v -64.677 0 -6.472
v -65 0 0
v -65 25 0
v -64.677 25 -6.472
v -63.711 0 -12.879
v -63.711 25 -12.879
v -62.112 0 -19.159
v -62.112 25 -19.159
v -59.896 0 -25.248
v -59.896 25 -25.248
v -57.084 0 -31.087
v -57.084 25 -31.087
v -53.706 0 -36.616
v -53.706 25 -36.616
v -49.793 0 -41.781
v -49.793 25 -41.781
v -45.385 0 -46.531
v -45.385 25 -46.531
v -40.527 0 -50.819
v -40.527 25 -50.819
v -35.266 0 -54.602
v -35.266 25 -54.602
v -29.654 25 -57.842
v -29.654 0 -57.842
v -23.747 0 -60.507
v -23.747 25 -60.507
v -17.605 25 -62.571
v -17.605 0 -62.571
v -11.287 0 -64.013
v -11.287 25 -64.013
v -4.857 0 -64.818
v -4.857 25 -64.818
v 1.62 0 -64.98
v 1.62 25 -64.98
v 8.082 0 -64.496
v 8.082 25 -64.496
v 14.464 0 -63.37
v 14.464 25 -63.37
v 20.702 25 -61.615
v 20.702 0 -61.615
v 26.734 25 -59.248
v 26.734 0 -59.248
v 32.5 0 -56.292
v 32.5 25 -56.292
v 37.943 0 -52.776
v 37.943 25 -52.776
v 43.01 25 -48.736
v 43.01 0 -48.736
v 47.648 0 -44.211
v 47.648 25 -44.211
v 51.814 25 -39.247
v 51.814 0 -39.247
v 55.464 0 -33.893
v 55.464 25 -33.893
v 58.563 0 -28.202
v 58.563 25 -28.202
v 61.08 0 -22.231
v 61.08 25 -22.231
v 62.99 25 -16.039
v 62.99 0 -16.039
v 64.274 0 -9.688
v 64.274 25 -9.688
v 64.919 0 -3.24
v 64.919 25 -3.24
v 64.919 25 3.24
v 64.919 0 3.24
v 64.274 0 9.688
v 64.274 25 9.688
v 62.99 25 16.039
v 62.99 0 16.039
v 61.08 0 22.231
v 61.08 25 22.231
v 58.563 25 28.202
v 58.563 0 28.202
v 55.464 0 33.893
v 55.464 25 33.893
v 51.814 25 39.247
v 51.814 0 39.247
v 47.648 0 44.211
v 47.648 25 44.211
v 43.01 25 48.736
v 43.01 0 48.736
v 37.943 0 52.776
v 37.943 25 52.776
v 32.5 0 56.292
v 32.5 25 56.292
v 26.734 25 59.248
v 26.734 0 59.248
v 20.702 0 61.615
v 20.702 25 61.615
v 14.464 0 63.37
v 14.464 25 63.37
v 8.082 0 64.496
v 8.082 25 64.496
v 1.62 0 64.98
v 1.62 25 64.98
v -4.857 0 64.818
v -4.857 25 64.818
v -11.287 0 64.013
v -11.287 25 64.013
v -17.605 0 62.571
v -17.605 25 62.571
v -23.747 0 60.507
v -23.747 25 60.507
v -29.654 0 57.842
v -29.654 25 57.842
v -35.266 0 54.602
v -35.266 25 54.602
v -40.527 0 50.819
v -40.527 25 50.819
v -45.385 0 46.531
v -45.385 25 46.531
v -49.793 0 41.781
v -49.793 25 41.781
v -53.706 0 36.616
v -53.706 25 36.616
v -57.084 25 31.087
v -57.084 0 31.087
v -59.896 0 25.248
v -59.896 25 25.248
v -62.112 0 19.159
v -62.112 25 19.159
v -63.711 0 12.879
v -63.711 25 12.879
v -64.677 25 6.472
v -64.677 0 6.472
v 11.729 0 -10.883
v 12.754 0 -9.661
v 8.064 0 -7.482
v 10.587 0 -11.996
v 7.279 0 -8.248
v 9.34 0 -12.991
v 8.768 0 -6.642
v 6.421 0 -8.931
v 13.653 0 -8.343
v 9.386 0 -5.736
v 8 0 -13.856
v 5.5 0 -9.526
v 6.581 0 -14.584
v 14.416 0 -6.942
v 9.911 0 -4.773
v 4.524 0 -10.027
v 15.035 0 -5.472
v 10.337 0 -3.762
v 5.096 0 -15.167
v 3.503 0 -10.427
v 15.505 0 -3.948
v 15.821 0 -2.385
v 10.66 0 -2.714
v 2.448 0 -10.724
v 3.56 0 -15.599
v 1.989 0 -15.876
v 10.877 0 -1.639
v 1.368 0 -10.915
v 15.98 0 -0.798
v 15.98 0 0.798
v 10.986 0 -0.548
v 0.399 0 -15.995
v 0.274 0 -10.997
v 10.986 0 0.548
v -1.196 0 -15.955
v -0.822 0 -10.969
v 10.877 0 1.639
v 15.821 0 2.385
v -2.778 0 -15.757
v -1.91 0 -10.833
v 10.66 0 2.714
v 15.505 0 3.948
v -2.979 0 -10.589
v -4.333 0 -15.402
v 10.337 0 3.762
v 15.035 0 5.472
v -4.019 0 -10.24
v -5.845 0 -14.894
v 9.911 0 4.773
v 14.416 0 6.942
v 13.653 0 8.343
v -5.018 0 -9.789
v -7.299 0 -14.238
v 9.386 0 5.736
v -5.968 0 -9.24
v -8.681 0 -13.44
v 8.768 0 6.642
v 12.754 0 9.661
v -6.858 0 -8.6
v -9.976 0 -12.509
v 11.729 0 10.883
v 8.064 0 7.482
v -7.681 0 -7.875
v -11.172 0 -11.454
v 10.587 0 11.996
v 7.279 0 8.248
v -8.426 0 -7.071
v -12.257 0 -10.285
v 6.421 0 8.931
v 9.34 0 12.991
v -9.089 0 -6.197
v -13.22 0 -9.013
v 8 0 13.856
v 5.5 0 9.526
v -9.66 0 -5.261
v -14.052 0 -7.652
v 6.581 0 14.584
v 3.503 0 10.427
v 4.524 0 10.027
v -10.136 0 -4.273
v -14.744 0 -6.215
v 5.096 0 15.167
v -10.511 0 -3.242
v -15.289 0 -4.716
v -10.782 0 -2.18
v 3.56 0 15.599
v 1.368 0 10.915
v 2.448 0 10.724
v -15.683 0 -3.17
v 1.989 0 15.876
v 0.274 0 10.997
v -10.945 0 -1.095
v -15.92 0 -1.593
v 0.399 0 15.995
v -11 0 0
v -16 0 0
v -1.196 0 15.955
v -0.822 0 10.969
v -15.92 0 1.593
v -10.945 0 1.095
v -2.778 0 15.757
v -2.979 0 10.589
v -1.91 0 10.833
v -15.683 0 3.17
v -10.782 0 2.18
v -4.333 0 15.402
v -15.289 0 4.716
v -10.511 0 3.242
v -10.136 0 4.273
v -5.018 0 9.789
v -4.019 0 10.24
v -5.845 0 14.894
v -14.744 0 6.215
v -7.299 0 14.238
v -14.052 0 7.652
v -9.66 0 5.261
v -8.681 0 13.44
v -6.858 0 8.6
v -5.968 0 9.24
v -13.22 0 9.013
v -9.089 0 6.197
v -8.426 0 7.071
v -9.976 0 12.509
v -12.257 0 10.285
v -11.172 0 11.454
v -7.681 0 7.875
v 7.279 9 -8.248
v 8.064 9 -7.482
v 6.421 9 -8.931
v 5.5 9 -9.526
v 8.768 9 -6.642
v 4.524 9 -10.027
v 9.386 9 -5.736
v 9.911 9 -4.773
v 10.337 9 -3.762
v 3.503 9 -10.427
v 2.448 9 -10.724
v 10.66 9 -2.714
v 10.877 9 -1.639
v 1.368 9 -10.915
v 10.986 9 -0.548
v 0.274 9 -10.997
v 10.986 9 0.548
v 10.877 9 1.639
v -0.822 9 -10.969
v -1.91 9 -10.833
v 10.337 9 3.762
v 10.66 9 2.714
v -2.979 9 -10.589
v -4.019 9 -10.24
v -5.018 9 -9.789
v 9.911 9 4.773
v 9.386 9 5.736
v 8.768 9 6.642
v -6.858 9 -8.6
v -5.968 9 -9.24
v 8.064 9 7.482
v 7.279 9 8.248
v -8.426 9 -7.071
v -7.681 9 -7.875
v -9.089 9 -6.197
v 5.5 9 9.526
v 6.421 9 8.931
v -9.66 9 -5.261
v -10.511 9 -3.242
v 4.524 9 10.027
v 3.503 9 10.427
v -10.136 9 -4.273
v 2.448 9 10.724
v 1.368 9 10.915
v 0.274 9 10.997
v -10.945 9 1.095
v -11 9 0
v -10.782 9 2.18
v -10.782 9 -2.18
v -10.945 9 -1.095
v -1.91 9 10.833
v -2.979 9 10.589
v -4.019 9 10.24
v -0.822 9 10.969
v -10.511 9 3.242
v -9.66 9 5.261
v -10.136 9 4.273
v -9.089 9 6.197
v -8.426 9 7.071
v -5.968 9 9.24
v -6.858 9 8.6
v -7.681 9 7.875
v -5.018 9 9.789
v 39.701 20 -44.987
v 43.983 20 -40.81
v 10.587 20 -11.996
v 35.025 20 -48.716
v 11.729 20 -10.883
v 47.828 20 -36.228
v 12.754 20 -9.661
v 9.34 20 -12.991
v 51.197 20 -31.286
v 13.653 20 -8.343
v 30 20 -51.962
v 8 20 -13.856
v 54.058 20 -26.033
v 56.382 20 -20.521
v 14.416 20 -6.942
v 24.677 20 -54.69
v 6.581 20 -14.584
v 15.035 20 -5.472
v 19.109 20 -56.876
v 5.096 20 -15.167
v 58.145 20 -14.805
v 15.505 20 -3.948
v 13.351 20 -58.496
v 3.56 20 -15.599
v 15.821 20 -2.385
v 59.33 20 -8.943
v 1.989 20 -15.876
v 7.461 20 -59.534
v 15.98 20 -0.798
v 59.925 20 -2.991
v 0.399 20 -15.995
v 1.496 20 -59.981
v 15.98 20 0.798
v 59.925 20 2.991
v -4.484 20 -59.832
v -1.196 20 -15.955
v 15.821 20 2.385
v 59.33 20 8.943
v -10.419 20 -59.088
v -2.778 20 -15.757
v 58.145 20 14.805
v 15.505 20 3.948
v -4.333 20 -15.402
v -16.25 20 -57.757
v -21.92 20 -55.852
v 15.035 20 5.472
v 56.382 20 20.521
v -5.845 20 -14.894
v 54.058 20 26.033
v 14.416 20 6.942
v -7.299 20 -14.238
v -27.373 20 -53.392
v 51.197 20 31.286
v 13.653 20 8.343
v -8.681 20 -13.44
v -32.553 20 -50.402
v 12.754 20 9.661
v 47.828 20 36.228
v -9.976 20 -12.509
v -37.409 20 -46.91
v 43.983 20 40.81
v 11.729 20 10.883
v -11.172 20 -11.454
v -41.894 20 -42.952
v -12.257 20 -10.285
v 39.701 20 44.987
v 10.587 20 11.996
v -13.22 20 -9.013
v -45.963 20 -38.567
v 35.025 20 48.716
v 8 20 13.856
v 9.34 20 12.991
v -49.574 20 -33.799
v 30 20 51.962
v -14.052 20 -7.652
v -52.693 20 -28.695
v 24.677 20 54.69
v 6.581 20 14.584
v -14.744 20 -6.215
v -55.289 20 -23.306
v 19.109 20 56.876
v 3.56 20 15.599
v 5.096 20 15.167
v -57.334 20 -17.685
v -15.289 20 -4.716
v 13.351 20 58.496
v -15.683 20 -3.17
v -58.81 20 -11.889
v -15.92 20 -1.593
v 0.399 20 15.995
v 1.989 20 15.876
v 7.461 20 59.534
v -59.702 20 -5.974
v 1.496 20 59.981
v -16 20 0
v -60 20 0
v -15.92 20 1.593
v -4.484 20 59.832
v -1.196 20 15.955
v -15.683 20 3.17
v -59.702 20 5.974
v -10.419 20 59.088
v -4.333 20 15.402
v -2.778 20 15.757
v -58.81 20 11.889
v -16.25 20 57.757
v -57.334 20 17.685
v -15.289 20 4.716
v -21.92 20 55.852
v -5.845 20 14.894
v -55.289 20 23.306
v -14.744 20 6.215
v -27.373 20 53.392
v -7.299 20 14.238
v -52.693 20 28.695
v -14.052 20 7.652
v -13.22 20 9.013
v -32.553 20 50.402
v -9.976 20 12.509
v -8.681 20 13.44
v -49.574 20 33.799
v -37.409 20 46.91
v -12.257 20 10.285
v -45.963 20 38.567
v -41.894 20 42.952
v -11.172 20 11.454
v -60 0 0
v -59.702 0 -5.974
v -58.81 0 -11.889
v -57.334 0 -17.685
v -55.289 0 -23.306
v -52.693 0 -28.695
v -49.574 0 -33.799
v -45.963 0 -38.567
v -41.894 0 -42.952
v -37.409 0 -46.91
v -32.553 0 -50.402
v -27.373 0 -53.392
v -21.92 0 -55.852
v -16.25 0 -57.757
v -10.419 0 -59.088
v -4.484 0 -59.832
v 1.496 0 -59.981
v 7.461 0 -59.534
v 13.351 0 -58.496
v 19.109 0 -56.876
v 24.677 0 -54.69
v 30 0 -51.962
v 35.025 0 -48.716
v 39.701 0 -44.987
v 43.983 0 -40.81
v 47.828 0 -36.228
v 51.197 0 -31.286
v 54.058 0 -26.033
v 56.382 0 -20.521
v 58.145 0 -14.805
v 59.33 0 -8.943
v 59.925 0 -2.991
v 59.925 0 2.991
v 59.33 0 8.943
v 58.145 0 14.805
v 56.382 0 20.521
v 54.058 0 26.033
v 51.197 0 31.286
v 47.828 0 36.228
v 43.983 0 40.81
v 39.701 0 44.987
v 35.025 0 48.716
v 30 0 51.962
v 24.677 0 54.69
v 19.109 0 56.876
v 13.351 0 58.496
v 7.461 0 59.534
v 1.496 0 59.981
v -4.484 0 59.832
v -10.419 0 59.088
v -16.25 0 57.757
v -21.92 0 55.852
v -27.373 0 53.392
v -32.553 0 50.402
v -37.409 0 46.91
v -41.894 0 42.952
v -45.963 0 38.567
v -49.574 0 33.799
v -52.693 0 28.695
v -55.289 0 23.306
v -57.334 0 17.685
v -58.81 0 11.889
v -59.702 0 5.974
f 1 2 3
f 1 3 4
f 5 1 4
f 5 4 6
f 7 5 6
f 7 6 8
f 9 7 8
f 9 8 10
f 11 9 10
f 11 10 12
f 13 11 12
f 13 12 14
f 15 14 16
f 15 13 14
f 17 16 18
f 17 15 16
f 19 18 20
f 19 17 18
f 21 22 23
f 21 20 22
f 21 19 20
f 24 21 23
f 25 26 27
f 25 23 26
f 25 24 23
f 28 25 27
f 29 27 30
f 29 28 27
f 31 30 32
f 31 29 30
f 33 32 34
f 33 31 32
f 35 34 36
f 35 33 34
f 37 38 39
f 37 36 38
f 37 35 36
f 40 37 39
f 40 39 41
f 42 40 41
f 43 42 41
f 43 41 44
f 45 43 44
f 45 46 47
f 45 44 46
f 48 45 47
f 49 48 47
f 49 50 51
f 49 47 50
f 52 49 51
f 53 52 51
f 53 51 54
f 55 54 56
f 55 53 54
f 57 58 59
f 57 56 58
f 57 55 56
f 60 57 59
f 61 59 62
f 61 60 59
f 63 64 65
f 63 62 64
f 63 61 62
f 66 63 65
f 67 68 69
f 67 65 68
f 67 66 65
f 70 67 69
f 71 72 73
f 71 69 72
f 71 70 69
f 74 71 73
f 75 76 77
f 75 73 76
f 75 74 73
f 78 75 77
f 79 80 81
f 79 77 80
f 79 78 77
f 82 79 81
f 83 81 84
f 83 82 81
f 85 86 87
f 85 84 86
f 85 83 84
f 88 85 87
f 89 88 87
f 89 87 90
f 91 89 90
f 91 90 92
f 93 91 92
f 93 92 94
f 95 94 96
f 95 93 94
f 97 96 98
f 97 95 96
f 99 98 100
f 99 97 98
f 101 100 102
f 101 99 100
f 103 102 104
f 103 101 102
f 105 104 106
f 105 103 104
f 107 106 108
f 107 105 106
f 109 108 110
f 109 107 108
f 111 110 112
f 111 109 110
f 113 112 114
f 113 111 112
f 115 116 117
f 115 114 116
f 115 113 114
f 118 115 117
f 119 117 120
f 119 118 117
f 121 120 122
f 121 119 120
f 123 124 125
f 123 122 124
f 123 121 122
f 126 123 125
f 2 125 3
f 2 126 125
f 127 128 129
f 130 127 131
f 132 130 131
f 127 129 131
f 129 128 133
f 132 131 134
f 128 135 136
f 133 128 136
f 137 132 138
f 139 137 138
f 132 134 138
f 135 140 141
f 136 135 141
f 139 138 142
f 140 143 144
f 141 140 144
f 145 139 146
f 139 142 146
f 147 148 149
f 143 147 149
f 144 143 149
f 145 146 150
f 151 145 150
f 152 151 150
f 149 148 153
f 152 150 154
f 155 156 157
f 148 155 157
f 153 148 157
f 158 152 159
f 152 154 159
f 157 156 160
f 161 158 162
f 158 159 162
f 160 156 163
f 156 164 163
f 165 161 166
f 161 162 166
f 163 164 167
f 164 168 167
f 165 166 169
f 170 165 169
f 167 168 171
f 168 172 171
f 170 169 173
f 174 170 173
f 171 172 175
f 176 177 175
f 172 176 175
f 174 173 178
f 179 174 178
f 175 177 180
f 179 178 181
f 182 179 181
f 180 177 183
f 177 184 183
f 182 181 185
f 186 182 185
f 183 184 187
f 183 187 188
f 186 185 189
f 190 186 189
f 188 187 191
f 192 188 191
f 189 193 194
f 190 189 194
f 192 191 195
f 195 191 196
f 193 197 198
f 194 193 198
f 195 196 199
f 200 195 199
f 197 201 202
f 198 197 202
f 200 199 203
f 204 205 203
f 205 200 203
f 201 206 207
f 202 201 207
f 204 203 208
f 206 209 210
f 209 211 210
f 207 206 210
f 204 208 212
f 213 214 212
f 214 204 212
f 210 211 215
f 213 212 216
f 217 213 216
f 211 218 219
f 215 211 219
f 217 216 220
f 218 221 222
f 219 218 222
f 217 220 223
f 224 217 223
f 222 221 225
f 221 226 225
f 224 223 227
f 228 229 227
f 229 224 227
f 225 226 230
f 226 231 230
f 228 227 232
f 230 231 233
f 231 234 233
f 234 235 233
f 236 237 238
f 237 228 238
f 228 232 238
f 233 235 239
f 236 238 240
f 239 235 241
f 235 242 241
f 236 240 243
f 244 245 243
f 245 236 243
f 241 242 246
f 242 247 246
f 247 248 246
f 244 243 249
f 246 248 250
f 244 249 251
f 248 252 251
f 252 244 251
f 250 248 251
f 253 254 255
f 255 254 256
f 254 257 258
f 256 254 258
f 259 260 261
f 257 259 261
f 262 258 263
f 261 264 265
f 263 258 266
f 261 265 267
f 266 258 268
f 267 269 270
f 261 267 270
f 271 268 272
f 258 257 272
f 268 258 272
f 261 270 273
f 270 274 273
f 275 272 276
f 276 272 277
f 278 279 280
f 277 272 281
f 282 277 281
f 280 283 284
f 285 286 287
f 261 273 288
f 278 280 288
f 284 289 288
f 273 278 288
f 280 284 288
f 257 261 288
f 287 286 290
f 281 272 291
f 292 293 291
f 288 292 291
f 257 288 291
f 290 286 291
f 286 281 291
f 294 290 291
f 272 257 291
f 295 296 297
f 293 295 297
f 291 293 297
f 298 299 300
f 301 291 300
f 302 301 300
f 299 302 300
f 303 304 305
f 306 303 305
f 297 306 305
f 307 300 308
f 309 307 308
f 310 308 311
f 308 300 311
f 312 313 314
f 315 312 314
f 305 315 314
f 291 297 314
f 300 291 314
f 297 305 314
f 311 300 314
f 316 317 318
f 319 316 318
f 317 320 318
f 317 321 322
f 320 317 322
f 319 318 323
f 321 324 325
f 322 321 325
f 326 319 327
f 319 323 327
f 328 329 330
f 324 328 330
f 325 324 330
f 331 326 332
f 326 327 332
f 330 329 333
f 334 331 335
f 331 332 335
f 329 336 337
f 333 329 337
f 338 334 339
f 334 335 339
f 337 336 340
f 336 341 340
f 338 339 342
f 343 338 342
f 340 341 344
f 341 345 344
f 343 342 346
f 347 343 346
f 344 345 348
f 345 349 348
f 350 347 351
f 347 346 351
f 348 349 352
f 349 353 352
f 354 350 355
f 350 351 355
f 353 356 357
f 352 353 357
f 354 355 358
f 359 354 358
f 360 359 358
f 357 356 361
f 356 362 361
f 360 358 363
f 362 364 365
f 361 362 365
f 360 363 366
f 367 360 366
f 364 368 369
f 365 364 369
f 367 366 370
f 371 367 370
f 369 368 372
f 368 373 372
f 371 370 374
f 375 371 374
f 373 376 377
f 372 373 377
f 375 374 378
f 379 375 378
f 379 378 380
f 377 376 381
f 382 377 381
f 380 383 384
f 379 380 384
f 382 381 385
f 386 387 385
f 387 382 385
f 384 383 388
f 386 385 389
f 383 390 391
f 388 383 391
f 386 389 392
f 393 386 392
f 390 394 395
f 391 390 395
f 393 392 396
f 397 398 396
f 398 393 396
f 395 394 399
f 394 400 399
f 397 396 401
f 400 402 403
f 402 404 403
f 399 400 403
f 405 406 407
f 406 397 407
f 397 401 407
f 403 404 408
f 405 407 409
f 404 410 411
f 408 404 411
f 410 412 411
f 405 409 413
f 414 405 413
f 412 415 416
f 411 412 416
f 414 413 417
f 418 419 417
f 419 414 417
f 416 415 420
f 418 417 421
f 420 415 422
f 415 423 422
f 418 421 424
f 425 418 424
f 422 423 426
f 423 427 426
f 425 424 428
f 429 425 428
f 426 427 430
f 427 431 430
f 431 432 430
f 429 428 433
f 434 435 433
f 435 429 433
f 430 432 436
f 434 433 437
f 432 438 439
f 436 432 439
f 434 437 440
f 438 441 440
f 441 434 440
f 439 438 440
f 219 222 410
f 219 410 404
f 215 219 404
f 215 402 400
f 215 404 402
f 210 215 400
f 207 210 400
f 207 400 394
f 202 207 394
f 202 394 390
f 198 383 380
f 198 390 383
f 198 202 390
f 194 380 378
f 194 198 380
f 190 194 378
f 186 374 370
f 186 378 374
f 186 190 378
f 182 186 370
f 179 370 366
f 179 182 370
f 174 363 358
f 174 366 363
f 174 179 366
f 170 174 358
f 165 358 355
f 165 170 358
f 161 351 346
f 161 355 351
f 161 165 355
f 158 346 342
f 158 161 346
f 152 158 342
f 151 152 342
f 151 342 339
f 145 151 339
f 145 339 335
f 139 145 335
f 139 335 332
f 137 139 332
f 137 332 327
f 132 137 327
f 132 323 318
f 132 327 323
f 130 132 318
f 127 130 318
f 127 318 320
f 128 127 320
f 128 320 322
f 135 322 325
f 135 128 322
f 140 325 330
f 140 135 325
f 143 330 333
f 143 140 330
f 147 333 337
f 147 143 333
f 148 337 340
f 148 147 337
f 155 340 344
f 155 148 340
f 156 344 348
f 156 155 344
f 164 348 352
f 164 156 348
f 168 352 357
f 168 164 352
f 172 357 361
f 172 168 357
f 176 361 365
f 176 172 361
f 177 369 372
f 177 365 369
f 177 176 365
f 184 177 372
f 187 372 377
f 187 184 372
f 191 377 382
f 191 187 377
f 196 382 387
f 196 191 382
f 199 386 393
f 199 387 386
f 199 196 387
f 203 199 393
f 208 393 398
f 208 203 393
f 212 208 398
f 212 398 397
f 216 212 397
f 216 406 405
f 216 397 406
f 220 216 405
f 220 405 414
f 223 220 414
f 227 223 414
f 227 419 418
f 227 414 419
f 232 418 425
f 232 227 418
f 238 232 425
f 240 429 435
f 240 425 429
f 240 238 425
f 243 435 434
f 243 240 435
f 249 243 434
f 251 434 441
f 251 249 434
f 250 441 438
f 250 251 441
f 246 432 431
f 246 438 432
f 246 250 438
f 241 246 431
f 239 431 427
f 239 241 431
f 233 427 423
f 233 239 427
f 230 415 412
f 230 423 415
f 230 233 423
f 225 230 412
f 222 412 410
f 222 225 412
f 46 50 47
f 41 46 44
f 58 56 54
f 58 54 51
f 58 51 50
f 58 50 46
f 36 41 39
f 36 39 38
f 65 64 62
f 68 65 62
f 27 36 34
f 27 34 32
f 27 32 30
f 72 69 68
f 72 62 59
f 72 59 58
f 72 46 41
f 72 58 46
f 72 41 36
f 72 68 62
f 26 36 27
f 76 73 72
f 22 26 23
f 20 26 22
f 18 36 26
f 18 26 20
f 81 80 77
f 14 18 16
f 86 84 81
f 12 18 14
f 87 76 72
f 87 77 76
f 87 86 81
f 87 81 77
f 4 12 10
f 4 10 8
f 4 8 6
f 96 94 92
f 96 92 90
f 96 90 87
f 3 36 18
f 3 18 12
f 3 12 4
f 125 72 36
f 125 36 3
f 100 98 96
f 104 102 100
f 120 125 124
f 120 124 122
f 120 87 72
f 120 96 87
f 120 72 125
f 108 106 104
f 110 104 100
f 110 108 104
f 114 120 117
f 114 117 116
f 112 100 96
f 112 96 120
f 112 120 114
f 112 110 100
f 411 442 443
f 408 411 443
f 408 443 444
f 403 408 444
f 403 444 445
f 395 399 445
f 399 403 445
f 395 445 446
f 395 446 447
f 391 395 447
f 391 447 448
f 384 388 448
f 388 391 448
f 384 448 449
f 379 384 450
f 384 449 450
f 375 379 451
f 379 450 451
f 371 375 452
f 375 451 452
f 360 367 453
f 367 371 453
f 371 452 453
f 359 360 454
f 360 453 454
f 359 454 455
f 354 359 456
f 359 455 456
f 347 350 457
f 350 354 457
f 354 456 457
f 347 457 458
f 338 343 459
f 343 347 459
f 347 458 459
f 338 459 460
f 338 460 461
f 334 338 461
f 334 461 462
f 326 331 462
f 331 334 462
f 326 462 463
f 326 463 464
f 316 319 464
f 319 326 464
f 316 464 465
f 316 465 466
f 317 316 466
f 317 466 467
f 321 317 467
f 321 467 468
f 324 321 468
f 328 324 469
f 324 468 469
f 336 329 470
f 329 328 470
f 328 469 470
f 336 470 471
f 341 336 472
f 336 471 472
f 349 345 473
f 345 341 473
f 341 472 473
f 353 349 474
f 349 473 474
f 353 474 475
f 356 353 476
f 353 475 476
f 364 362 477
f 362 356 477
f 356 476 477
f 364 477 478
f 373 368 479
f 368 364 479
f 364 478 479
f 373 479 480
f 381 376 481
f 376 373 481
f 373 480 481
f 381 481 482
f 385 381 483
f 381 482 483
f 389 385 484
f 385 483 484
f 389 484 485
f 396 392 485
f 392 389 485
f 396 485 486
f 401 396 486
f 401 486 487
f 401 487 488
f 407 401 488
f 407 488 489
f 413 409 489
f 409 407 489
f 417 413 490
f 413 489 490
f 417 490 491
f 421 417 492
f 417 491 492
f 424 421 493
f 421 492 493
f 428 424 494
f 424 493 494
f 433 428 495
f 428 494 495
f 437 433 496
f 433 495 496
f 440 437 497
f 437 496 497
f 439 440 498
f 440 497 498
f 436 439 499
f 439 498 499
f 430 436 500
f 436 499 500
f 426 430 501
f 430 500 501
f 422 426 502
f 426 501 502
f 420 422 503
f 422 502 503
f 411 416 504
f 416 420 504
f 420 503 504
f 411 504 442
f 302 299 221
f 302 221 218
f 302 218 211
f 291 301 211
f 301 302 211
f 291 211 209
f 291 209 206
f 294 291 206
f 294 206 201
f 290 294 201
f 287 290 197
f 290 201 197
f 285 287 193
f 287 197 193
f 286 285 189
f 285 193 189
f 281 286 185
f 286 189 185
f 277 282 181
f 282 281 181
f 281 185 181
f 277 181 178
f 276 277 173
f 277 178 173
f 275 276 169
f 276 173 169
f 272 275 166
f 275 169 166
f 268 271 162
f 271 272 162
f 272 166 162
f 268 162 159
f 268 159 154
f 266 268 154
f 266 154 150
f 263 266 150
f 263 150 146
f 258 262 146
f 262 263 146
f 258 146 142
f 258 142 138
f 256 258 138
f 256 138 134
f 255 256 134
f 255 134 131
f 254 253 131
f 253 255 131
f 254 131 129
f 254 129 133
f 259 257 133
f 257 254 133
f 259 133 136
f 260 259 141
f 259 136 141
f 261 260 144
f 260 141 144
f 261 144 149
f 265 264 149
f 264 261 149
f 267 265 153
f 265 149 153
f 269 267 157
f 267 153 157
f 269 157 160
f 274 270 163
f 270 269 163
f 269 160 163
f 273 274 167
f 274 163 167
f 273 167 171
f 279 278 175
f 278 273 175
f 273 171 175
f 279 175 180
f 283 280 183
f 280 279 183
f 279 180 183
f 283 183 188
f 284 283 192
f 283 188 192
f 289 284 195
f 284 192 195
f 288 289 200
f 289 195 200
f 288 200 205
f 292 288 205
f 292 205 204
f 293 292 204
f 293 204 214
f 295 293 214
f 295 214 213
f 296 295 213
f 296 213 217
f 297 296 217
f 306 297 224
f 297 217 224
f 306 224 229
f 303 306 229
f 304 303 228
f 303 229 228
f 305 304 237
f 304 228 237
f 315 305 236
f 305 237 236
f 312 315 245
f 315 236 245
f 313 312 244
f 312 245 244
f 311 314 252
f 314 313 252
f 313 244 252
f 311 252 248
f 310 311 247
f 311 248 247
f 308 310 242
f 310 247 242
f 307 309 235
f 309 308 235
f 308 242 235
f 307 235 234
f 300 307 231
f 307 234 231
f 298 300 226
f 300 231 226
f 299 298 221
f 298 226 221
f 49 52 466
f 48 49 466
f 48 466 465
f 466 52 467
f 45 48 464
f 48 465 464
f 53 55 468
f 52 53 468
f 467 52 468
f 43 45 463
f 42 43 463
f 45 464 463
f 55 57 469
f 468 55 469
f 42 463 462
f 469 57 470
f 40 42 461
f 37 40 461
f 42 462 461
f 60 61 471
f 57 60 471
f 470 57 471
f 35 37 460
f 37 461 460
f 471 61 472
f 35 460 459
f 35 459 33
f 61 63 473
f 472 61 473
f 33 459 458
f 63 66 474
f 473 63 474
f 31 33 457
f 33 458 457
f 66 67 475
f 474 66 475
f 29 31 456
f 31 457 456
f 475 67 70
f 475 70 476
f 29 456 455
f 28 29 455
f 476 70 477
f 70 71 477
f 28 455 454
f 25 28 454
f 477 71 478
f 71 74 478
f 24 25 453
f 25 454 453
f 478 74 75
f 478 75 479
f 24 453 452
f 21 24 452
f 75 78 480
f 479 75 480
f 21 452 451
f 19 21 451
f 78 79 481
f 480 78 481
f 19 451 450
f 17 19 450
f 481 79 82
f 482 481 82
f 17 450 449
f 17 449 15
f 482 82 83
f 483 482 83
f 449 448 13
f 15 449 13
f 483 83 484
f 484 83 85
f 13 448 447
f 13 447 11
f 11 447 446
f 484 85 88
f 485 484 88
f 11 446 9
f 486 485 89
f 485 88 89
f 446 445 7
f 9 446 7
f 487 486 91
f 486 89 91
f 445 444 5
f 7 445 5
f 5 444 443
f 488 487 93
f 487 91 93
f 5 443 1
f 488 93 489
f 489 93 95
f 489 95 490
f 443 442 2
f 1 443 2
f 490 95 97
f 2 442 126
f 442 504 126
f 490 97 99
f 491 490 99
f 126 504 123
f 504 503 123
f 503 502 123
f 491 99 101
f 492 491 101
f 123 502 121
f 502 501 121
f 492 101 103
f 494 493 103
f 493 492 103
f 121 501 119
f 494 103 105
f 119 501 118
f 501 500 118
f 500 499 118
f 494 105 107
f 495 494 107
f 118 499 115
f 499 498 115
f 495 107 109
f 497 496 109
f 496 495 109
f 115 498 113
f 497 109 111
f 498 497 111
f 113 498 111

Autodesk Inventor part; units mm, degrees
ref_plane "YZ Plane" through (0, 0, 0) normal (1, 0, 0) x (0, 1, 0)
ref_plane "XZ Plane" through (0, 0, 0) normal (0, 1, 0) x (-1, 0, 0)
ref_plane "XY Plane" through (0, 0, 0) normal (0, 0, 1) x (1, 0, 0)
sketch "スケッチ1" plane through (0, 0, 0) normal (0, 1, 0) x (-1, 0, 0)
  circle A0 centre (0, 0) radius 65
  circle A1 centre (0, 0) radius 60
  circle A2 centre (0, 0) radius 16
  circle A3 centre (0, 0) radius 11
  dimension "d0" = 130
  dimension "d3" = 120
  dimension "d4" = 32
  dimension "d5" = 22
extrude "押し出し1" add sketch "スケッチ1" along normal blind 25 contours A0 | A1 | A2 | A3
extrude "押し出し2" cut sketch "スケッチ1" along normal blind 20 contours A1
extrude "押し出し3" cut sketch "スケッチ1" along normal blind 9 contours A3
properties part number "18-1"
